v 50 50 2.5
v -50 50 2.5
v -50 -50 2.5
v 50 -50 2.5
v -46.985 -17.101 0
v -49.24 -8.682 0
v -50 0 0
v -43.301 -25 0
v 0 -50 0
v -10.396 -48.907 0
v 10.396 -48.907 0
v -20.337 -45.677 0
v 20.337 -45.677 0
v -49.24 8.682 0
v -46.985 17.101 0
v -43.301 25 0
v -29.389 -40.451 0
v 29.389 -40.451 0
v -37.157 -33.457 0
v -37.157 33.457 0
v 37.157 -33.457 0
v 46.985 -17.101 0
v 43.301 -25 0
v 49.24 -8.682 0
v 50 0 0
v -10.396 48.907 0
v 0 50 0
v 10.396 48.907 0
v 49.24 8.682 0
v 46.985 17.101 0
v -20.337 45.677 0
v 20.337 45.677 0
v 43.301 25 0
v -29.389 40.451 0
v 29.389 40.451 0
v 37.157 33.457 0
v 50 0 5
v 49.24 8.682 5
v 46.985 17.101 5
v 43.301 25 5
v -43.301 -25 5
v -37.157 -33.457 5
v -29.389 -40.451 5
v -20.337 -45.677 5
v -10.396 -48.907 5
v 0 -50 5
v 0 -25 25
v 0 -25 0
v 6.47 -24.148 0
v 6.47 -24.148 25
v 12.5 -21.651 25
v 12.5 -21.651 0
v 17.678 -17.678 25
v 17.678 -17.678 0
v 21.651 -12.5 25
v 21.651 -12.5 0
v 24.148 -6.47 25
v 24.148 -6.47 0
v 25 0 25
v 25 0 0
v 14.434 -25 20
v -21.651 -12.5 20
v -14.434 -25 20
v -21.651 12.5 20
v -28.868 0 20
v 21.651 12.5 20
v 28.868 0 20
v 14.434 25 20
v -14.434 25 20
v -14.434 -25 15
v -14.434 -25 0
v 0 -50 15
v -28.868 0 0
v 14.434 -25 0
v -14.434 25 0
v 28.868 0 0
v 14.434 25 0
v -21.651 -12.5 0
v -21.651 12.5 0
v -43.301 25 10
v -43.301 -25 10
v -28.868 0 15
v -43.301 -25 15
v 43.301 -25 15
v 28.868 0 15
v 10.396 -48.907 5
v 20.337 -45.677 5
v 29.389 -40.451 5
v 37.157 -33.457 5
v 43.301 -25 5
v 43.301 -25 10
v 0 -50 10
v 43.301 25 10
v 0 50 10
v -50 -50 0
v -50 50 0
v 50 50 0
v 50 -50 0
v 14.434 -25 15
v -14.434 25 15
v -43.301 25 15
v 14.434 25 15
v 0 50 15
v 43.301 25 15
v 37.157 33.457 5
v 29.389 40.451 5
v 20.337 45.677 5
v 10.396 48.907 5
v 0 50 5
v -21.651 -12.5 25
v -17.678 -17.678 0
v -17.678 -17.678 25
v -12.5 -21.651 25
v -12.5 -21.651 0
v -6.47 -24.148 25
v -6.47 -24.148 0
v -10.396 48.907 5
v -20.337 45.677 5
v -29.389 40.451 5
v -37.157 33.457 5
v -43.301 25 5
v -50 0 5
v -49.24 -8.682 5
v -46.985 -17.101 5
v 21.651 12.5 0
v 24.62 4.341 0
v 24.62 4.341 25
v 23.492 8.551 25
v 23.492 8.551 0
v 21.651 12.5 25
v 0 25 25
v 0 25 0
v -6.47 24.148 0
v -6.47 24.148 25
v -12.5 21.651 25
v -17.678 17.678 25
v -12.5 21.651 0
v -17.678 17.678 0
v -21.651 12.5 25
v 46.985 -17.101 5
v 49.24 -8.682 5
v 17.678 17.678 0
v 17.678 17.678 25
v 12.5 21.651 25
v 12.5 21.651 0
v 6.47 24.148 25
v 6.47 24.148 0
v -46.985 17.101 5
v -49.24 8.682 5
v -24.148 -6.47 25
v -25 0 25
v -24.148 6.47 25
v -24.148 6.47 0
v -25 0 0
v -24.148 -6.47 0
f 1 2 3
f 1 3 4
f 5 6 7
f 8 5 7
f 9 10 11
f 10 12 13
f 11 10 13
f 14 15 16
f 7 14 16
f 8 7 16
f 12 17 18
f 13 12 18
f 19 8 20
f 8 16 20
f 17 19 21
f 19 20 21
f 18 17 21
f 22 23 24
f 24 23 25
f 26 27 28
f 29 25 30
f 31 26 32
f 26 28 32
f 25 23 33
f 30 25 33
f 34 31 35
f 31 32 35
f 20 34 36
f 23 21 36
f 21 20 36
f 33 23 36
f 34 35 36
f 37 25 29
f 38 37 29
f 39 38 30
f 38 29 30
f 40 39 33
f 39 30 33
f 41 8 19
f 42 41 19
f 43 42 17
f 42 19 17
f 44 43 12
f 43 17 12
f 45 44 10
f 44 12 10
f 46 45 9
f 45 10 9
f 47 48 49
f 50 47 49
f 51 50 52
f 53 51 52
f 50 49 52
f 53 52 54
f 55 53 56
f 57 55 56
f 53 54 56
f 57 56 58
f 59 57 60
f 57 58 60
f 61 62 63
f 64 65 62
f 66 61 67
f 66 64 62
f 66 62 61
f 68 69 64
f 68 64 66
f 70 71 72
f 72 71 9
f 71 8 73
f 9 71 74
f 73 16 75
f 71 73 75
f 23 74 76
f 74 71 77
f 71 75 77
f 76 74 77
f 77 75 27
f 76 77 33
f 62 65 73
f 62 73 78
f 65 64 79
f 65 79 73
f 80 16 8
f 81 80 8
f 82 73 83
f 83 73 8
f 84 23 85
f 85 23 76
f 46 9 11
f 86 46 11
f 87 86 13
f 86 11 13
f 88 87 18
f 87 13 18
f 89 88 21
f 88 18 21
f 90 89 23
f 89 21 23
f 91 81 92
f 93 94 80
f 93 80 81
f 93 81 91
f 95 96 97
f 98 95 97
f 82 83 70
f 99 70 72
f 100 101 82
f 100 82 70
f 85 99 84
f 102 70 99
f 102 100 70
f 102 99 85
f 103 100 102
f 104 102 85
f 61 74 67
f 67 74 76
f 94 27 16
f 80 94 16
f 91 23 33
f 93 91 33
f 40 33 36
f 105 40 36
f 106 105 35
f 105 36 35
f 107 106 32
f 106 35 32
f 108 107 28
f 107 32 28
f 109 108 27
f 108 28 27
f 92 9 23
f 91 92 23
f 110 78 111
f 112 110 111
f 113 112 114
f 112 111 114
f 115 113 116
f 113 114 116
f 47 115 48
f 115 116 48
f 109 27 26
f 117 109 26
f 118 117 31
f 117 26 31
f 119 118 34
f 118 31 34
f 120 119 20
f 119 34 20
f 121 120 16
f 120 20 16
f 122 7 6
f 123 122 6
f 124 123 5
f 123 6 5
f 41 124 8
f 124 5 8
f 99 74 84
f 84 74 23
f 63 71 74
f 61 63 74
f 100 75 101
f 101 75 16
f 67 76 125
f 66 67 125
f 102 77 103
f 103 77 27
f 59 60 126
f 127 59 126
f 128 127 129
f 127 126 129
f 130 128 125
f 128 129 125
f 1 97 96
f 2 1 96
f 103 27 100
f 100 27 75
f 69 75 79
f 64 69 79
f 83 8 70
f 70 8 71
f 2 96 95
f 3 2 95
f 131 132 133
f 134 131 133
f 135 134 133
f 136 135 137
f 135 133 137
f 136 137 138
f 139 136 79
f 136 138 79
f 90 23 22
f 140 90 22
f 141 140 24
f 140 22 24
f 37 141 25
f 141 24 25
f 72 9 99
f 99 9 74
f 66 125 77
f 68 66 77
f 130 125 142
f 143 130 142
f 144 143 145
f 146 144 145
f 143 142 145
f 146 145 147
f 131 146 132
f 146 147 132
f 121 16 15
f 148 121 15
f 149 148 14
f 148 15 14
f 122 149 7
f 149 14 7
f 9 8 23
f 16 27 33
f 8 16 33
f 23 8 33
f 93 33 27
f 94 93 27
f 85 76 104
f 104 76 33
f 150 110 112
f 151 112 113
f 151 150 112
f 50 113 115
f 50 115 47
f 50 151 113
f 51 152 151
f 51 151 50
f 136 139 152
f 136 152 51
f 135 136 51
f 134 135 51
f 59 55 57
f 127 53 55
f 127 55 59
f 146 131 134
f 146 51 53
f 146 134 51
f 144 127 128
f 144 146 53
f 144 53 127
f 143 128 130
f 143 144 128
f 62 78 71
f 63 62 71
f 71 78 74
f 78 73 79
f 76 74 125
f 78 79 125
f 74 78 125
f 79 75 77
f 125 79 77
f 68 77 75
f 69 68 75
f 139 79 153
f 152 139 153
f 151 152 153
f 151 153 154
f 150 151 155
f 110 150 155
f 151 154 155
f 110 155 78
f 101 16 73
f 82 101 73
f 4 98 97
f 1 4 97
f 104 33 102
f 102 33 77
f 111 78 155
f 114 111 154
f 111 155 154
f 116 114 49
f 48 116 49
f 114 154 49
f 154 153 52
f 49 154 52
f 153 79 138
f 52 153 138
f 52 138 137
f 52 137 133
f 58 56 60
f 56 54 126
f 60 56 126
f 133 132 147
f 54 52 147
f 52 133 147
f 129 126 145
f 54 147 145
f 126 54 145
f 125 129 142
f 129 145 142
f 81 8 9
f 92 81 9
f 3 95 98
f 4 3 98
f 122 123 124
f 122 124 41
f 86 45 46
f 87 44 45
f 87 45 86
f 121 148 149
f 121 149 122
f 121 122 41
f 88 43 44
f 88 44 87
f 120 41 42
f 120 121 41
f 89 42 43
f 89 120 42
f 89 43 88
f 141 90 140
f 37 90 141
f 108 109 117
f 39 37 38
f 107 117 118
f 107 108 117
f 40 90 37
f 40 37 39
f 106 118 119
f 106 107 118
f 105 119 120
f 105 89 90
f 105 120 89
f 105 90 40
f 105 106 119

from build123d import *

# Parameters (mm, degrees)
F1_DEPTH = 25
F2_DEPTH = 20
F3_DEPTH = 15
F4_DEPTH = 10
F5_DEPTH = 5
F6_DEPTH = 2.5


with BuildPart() as f1:
    # F0 (on Top) → F1 (new body)
    with BuildSketch(Plane.XY):
        with BuildLine():
            ThreePointArc((21.6506349485, 12.5000002531), (12.4999998734, 21.6506351677), (0, 25))
            ThreePointArc((0, 25), (-12.499999828, 21.6506351939), (-21.650634896, 12.500000344))
            ThreePointArc((-21.650634896, 12.500000344), (-25, 2.051e-07), (-21.6506351011, -12.4999999888))
            ThreePointArc((-21.6506351011, -12.4999999888), (-12.4999999898, -21.6506351005), (3.65e-08, -25))
            ThreePointArc((3.65e-08, -25), (12.5000002944, -21.6506349246), (21.6506354163, -12.4999994428))
            ThreePointArc((21.6506354163, -12.4999994428), (24.1481457405, -6.4704758168), (25, 0))
            ThreePointArc((25, 0), (24.1481456194, 6.4704762687), (21.6506349485, 12.5000002531))
        make_face()
    extrude(amount=F1_DEPTH)


with BuildPart() as f2:
    # F0 (on Top) → F2 (new body)
    with BuildSketch(Plane.XY):
        with BuildLine():
            Line((-21.650634896, 12.500000344), (-28.8675134595, 0))
            Line((-28.8675134595, 0), (-21.6506351011, -12.4999999888))
            ThreePointArc((-21.6506351011, -12.4999999888), (-25, 2.051e-07), (-21.650634896, 12.500000344))
        make_face()
        with BuildLine():
            Line((0, 25), (-14.4337567297, 25))
            Line((-14.4337567297, 25), (-21.650634896, 12.500000344))
            ThreePointArc((-21.650634896, 12.500000344), (-12.499999828, 21.6506351939), (0, 25))
        make_face()
        with BuildLine():
            Line((21.6506349485, 12.5000002531), (14.4337567297, 25))
            Line((14.4337567297, 25), (0, 25))
            ThreePointArc((0, 25), (12.4999998734, 21.6506351677), (21.6506349485, 12.5000002531))
        make_face()
        with BuildLine():
            Line((21.6506354163, -12.4999994428), (28.8675134595, 0))
            Line((28.8675134595, 0), (21.6506349485, 12.5000002531))
            ThreePointArc((21.6506349485, 12.5000002531), (24.1481456194, 6.4704762687), (25, 0))
            ThreePointArc((25, 0), (24.1481457405, -6.4704758168), (21.6506354163, -12.4999994428))
        make_face()
        with BuildLine():
            Line((3.65e-08, -25), (14.4337567297, -25))
            Line((14.4337567297, -25), (21.6506354163, -12.4999994428))
            ThreePointArc((21.6506354163, -12.4999994428), (12.5000002944, -21.6506349246), (3.65e-08, -25))
        make_face()
        with BuildLine():
            Line((-21.6506351011, -12.4999999888), (-14.4337567297, -25))
            Line((-14.4337567297, -25), (3.65e-08, -25))
            ThreePointArc((3.65e-08, -25), (-12.4999999898, -21.6506351005), (-21.6506351011, -12.4999999888))
        make_face()
        with BuildLine():
            ThreePointArc((21.6506349485, 12.5000002531), (12.4999998734, 21.6506351677), (0, 25))
            ThreePointArc((0, 25), (-12.499999828, 21.6506351939), (-21.650634896, 12.500000344))
            ThreePointArc((-21.650634896, 12.500000344), (-25, 2.051e-07), (-21.6506351011, -12.4999999888))
            ThreePointArc((-21.6506351011, -12.4999999888), (-12.4999999898, -21.6506351005), (3.65e-08, -25))
            ThreePointArc((3.65e-08, -25), (12.5000002944, -21.6506349246), (21.6506354163, -12.4999994428))
            ThreePointArc((21.6506354163, -12.4999994428), (24.1481457405, -6.4704758168), (25, 0))
            ThreePointArc((25, 0), (24.1481456194, 6.4704762687), (21.6506349485, 12.5000002531))
        make_face()
    extrude(amount=F2_DEPTH)


with BuildPart() as f3:
    # F0 (on Top) → F3 (new body)
    with BuildSketch(Plane.XY):
        with BuildLine():
            Line((0, 25), (-14.4337567297, 25))
            Line((-14.4337567297, 25), (-21.650634896, 12.500000344))
            ThreePointArc((-21.650634896, 12.500000344), (-12.499999828, 21.6506351939), (0, 25))
        make_face()
        with BuildLine():
            Line((21.6506349485, 12.5000002531), (14.4337567297, 25))
            Line((14.4337567297, 25), (0, 25))
            ThreePointArc((0, 25), (12.4999998734, 21.6506351677), (21.6506349485, 12.5000002531))
        make_face()
        with BuildLine():
            ThreePointArc((21.6506349485, 12.5000002531), (12.4999998734, 21.6506351677), (0, 25))
            ThreePointArc((0, 25), (-12.499999828, 21.6506351939), (-21.650634896, 12.500000344))
            ThreePointArc((-21.650634896, 12.500000344), (-25, 2.051e-07), (-21.6506351011, -12.4999999888))
            ThreePointArc((-21.6506351011, -12.4999999888), (-12.4999999898, -21.6506351005), (3.65e-08, -25))
            ThreePointArc((3.65e-08, -25), (12.5000002944, -21.6506349246), (21.6506354163, -12.4999994428))
            ThreePointArc((21.6506354163, -12.4999994428), (24.1481457405, -6.4704758168), (25, 0))
            ThreePointArc((25, 0), (24.1481456194, 6.4704762687), (21.6506349485, 12.5000002531))
        make_face()
        with BuildLine():
            Line((21.6506354163, -12.4999994428), (28.8675134595, 0))
            Line((28.8675134595, 0), (21.6506349485, 12.5000002531))
            ThreePointArc((21.6506349485, 12.5000002531), (24.1481456194, 6.4704762687), (25, 0))
            ThreePointArc((25, 0), (24.1481457405, -6.4704758168), (21.6506354163, -12.4999994428))
        make_face()
        with BuildLine():
            Line((3.65e-08, -25), (14.4337567297, -25))
            Line((14.4337567297, -25), (21.6506354163, -12.4999994428))
            ThreePointArc((21.6506354163, -12.4999994428), (12.5000002944, -21.6506349246), (3.65e-08, -25))
        make_face()
        with BuildLine():
            Line((-21.6506351011, -12.4999999888), (-14.4337567297, -25))
            Line((-14.4337567297, -25), (3.65e-08, -25))
            ThreePointArc((3.65e-08, -25), (-12.4999999898, -21.6506351005), (-21.6506351011, -12.4999999888))
        make_face()
        with BuildLine():
            Line((-21.650634896, 12.500000344), (-28.8675134595, 0))
            Line((-28.8675134595, 0), (-21.6506351011, -12.4999999888))
            ThreePointArc((-21.6506351011, -12.4999999888), (-25, 2.051e-07), (-21.650634896, 12.500000344))
        make_face()
        Polygon((28.8675134595, 0), (43.3012701892, 25), (14.4337567297, 25), (21.6506349485, 12.5000002531), align=None)
        Polygon((-14.4337567297, -25), (0, -50), (14.4337567297, -25), (3.65e-08, -25), align=None)
        Polygon((14.4337567297, -25), (43.3012701892, -25), (28.8675134595, 0), (21.6506354163, -12.4999994428), align=None)
        Polygon((14.4337567297, 25), (0, 50), (-14.4337567297, 25), (0, 25), align=None)
        Polygon((-14.4337567297, 25), (-43.3012701892, 25), (-28.8675134595, 0), (-21.650634896, 12.500000344), align=None)
        Polygon((-28.8675134595, 0), (-43.3012701892, -25), (-14.4337567297, -25), (-21.6506351011, -12.4999999888), align=None)
    extrude(amount=F3_DEPTH)


with BuildPart() as f4:
    # F0 (on Top) → F4 (new body)
    with BuildSketch(Plane.XY):
        with BuildLine():
            ThreePointArc((21.6506349485, 12.5000002531), (12.4999998734, 21.6506351677), (0, 25))
            ThreePointArc((0, 25), (-12.499999828, 21.6506351939), (-21.650634896, 12.500000344))
            ThreePointArc((-21.650634896, 12.500000344), (-25, 2.051e-07), (-21.6506351011, -12.4999999888))
            ThreePointArc((-21.6506351011, -12.4999999888), (-12.4999999898, -21.6506351005), (3.65e-08, -25))
            ThreePointArc((3.65e-08, -25), (12.5000002944, -21.6506349246), (21.6506354163, -12.4999994428))
            ThreePointArc((21.6506354163, -12.4999994428), (24.1481457405, -6.4704758168), (25, 0))
            ThreePointArc((25, 0), (24.1481456194, 6.4704762687), (21.6506349485, 12.5000002531))
        make_face()
        with BuildLine():
            Line((0, 25), (-14.4337567297, 25))
            Line((-14.4337567297, 25), (-21.650634896, 12.500000344))
            ThreePointArc((-21.650634896, 12.500000344), (-12.499999828, 21.6506351939), (0, 25))
        make_face()
        with BuildLine():
            Line((21.6506349485, 12.5000002531), (14.4337567297, 25))
            Line((14.4337567297, 25), (0, 25))
            ThreePointArc((0, 25), (12.4999998734, 21.6506351677), (21.6506349485, 12.5000002531))
        make_face()
        with BuildLine():
            Line((21.6506354163, -12.4999994428), (28.8675134595, 0))
            Line((28.8675134595, 0), (21.6506349485, 12.5000002531))
            ThreePointArc((21.6506349485, 12.5000002531), (24.1481456194, 6.4704762687), (25, 0))
            ThreePointArc((25, 0), (24.1481457405, -6.4704758168), (21.6506354163, -12.4999994428))
        make_face()
        with BuildLine():
            Line((3.65e-08, -25), (14.4337567297, -25))
            Line((14.4337567297, -25), (21.6506354163, -12.4999994428))
            ThreePointArc((21.6506354163, -12.4999994428), (12.5000002944, -21.6506349246), (3.65e-08, -25))
        make_face()
        with BuildLine():
            Line((-21.6506351011, -12.4999999888), (-14.4337567297, -25))
            Line((-14.4337567297, -25), (3.65e-08, -25))
            ThreePointArc((3.65e-08, -25), (-12.4999999898, -21.6506351005), (-21.6506351011, -12.4999999888))
        make_face()
        with BuildLine():
            Line((-21.650634896, 12.500000344), (-28.8675134595, 0))
            Line((-28.8675134595, 0), (-21.6506351011, -12.4999999888))
            ThreePointArc((-21.6506351011, -12.4999999888), (-25, 2.051e-07), (-21.650634896, 12.500000344))
        make_face()
        Polygon((-14.4337567297, 25), (-43.3012701892, 25), (-28.8675134595, 0), (-21.650634896, 12.500000344), align=None)
        Polygon((-28.8675134595, 0), (-43.3012701892, -25), (-14.4337567297, -25), (-21.6506351011, -12.4999999888), align=None)
        Polygon((-14.4337567297, -25), (0, -50), (14.4337567297, -25), (3.65e-08, -25), align=None)
        Polygon((14.4337567297, -25), (43.3012701892, -25), (28.8675134595, 0), (21.6506354163, -12.4999994428), align=None)
        Polygon((28.8675134595, 0), (43.3012701892, 25), (14.4337567297, 25), (21.6506349485, 12.5000002531), align=None)
        Polygon((14.4337567297, 25), (0, 50), (-14.4337567297, 25), (0, 25), align=None)
        Polygon((-14.4337567297, 25), (0, 50), (-43.3012701892, 25), align=None)
        Polygon((14.4337567297, 25), (43.3012701892, 25), (0, 50), align=None)
        Polygon((43.3012701892, -25), (43.3012701892, 25), (28.8675134595, 0), align=None)
        Polygon((0, -50), (43.3012701892, -25), (14.4337567297, -25), align=None)
        Polygon((-43.3012701892, -25), (0, -50), (-14.4337567297, -25), align=None)
        Polygon((-28.8675134595, 0), (-43.3012701892, 25), (-43.3012701892, -25), align=None)
    extrude(amount=F4_DEPTH)


with BuildPart() as f5:
    # F0 (on Top) → F5 (new body)
    with BuildSketch(Plane.XY):
        with BuildLine():
            Line((-43.3012701892, 25), (0, 50))
            ThreePointArc((0, 50), (-25, 43.3012701892), (-43.3012701892, 25))
        make_face()
        with BuildLine():
            Line((0, 50), (43.3012701892, 25))
            ThreePointArc((43.3012701892, 25), (25, 43.3012701892), (0, 50))
        make_face()
        Polygon((-14.4337567297, 25), (0, 50), (-43.3012701892, 25), align=None)
        Polygon((14.4337567297, 25), (0, 50), (-14.4337567297, 25), (0, 25), align=None)
        Polygon((14.4337567297, 25), (43.3012701892, 25), (0, 50), align=None)
        Polygon((-14.4337567297, 25), (-43.3012701892, 25), (-28.8675134595, 0), (-21.650634896, 12.500000344), align=None)
        with BuildLine():
            Line((0, 25), (-14.4337567297, 25))
            Line((-14.4337567297, 25), (-21.650634896, 12.500000344))
            ThreePointArc((-21.650634896, 12.500000344), (-12.499999828, 21.6506351939), (0, 25))
        make_face()
        with BuildLine():
            Line((21.6506349485, 12.5000002531), (14.4337567297, 25))
            Line((14.4337567297, 25), (0, 25))
            ThreePointArc((0, 25), (12.4999998734, 21.6506351677), (21.6506349485, 12.5000002531))
        make_face()
        Polygon((28.8675134595, 0), (43.3012701892, 25), (14.4337567297, 25), (21.6506349485, 12.5000002531), align=None)
        with BuildLine():
            ThreePointArc((43.3012701892, -25), (48.2962913145, -12.9409522551), (50, 0))
            ThreePointArc((50, 0), (48.2962913145, 12.9409522551), (43.3012701892, 25))
            Line((43.3012701892, 25), (43.3012701892, -25))
        make_face()
        Polygon((43.3012701892, -25), (43.3012701892, 25), (28.8675134595, 0), align=None)
        with BuildLine():
            Line((21.6506354163, -12.4999994428), (28.8675134595, 0))
            Line((28.8675134595, 0), (21.6506349485, 12.5000002531))
            ThreePointArc((21.6506349485, 12.5000002531), (24.1481456194, 6.4704762687), (25, 0))
            ThreePointArc((25, 0), (24.1481457405, -6.4704758168), (21.6506354163, -12.4999994428))
        make_face()
        with BuildLine():
            ThreePointArc((21.6506349485, 12.5000002531), (12.4999998734, 21.6506351677), (0, 25))
            ThreePointArc((0, 25), (-12.499999828, 21.6506351939), (-21.650634896, 12.500000344))
            ThreePointArc((-21.650634896, 12.500000344), (-25, 2.051e-07), (-21.6506351011, -12.4999999888))
            ThreePointArc((-21.6506351011, -12.4999999888), (-12.4999999898, -21.6506351005), (3.65e-08, -25))
            ThreePointArc((3.65e-08, -25), (12.5000002944, -21.6506349246), (21.6506354163, -12.4999994428))
            ThreePointArc((21.6506354163, -12.4999994428), (24.1481457405, -6.4704758168), (25, 0))
            ThreePointArc((25, 0), (24.1481456194, 6.4704762687), (21.6506349485, 12.5000002531))
        make_face()
        with BuildLine():
            Line((-21.650634896, 12.500000344), (-28.8675134595, 0))
            Line((-28.8675134595, 0), (-21.6506351011, -12.4999999888))
            ThreePointArc((-21.6506351011, -12.4999999888), (-25, 2.051e-07), (-21.650634896, 12.500000344))
        make_face()
        Polygon((-28.8675134595, 0), (-43.3012701892, 25), (-43.3012701892, -25), align=None)
        with BuildLine():
            Line((-43.3012701892, -25), (-43.3012701892, 25))
            ThreePointArc((-43.3012701892, 25), (-48.2962913145, 12.9409522551), (-50, 0))
            ThreePointArc((-50, 0), (-48.2962913145, -12.9409522551), (-43.3012701892, -25))
        make_face()
        Polygon((-28.8675134595, 0), (-43.3012701892, -25), (-14.4337567297, -25), (-21.6506351011, -12.4999999888), align=None)
        with BuildLine():
            Line((-21.6506351011, -12.4999999888), (-14.4337567297, -25))
            Line((-14.4337567297, -25), (3.65e-08, -25))
            ThreePointArc((3.65e-08, -25), (-12.4999999898, -21.6506351005), (-21.6506351011, -12.4999999888))
        make_face()
        with BuildLine():
            Line((3.65e-08, -25), (14.4337567297, -25))
            Line((14.4337567297, -25), (21.6506354163, -12.4999994428))
            ThreePointArc((21.6506354163, -12.4999994428), (12.5000002944, -21.6506349246), (3.65e-08, -25))
        make_face()
        Polygon((14.4337567297, -25), (43.3012701892, -25), (28.8675134595, 0), (21.6506354163, -12.4999994428), align=None)
        Polygon((0, -50), (43.3012701892, -25), (14.4337567297, -25), align=None)
        Polygon((-14.4337567297, -25), (0, -50), (14.4337567297, -25), (3.65e-08, -25), align=None)
        Polygon((-43.3012701892, -25), (0, -50), (-14.4337567297, -25), align=None)
        with BuildLine():
            ThreePointArc((-43.3012701892, -25), (-25, -43.3012701892), (0, -50))
            Line((0, -50), (-43.3012701892, -25))
        make_face()
        with BuildLine():
            ThreePointArc((0, -50), (25, -43.3012701892), (43.3012701892, -25))
            Line((43.3012701892, -25), (0, -50))
        make_face()
    extrude(amount=F5_DEPTH)


with BuildPart() as f6:
    # F0 (on Top) → F6 (new body)
    with BuildSketch(Plane.XY):
        with BuildLine():
            ThreePointArc((-43.3012701892, 25), (-25, 43.3012701892), (0, 50))
            Line((0, 50), (-50, 50))
            Line((-50, 50), (-50, 0))
            ThreePointArc((-50, 0), (-48.2962913145, 12.9409522551), (-43.3012701892, 25))
        make_face()
        with BuildLine():
            Line((-43.3012701892, 25), (0, 50))
            ThreePointArc((0, 50), (-25, 43.3012701892), (-43.3012701892, 25))
        make_face()
        Polygon((-14.4337567297, 25), (0, 50), (-43.3012701892, 25), align=None)
        Polygon((14.4337567297, 25), (0, 50), (-14.4337567297, 25), (0, 25), align=None)
        with BuildLine():
            Line((0, 50), (43.3012701892, 25))
            ThreePointArc((43.3012701892, 25), (25, 43.3012701892), (0, 50))
        make_face()
        Polygon((14.4337567297, 25), (43.3012701892, 25), (0, 50), align=None)
        with BuildLine():
            ThreePointArc((43.3012701892, 25), (48.2962913145, 12.9409522551), (50, 0))
            Line((50, 0), (50, 50))
            Line((50, 50), (0, 50))
            ThreePointArc((0, 50), (25, 43.3012701892), (43.3012701892, 25))
        make_face()
        Polygon((28.8675134595, 0), (43.3012701892, 25), (14.4337567297, 25), (21.6506349485, 12.5000002531), align=None)
        Polygon((43.3012701892, -25), (43.3012701892, 25), (28.8675134595, 0), align=None)
        with BuildLine():
            ThreePointArc((43.3012701892, -25), (48.2962913145, -12.9409522551), (50, 0))
            ThreePointArc((50, 0), (48.2962913145, 12.9409522551), (43.3012701892, 25))
            Line((43.3012701892, 25), (43.3012701892, -25))
        make_face()
        with BuildLine():
            ThreePointArc((21.6506349485, 12.5000002531), (12.4999998734, 21.6506351677), (0, 25))
            ThreePointArc((0, 25), (-12.499999828, 21.6506351939), (-21.650634896, 12.500000344))
            ThreePointArc((-21.650634896, 12.500000344), (-25, 2.051e-07), (-21.6506351011, -12.4999999888))
            ThreePointArc((-21.6506351011, -12.4999999888), (-12.4999999898, -21.6506351005), (3.65e-08, -25))
            ThreePointArc((3.65e-08, -25), (12.5000002944, -21.6506349246), (21.6506354163, -12.4999994428))
            ThreePointArc((21.6506354163, -12.4999994428), (24.1481457405, -6.4704758168), (25, 0))
            ThreePointArc((25, 0), (24.1481456194, 6.4704762687), (21.6506349485, 12.5000002531))
        make_face()
        Polygon((-14.4337567297, 25), (-43.3012701892, 25), (-28.8675134595, 0), (-21.650634896, 12.500000344), align=None)
        Polygon((-28.8675134595, 0), (-43.3012701892, 25), (-43.3012701892, -25), align=None)
        with BuildLine():
            Line((-43.3012701892, -25), (-43.3012701892, 25))
            ThreePointArc((-43.3012701892, 25), (-48.2962913145, 12.9409522551), (-50, 0))
            ThreePointArc((-50, 0), (-48.2962913145, -12.9409522551), (-43.3012701892, -25))
        make_face()
        Polygon((-28.8675134595, 0), (-43.3012701892, -25), (-14.4337567297, -25), (-21.6506351011, -12.4999999888), align=None)
        with BuildLine():
            Line((-50, -50), (0, -50))
            ThreePointArc((0, -50), (-25, -43.3012701892), (-43.3012701892, -25))
            ThreePointArc((-43.3012701892, -25), (-48.2962913145, -12.9409522551), (-50, 0))
            Line((-50, 0), (-50, -50))
        make_face()
        with BuildLine():
            ThreePointArc((-43.3012701892, -25), (-25, -43.3012701892), (0, -50))
            Line((0, -50), (-43.3012701892, -25))
        make_face()
        Polygon((-43.3012701892, -25), (0, -50), (-14.4337567297, -25), align=None)
        Polygon((-14.4337567297, -25), (0, -50), (14.4337567297, -25), (3.65e-08, -25), align=None)
        Polygon((0, -50), (43.3012701892, -25), (14.4337567297, -25), align=None)
        Polygon((14.4337567297, -25), (43.3012701892, -25), (28.8675134595, 0), (21.6506354163, -12.4999994428), align=None)
        with BuildLine():
            ThreePointArc((0, -50), (25, -43.3012701892), (43.3012701892, -25))
            Line((43.3012701892, -25), (0, -50))
        make_face()
        with BuildLine():
            Line((50, -50), (50, 0))
            ThreePointArc((50, 0), (48.2962913145, -12.9409522551), (43.3012701892, -25))
            ThreePointArc((43.3012701892, -25), (25, -43.3012701892), (0, -50))
            Line((0, -50), (50, -50))
        make_face()
        with BuildLine():
            Line((0, 25), (-14.4337567297, 25))
            Line((-14.4337567297, 25), (-21.650634896, 12.500000344))
            ThreePointArc((-21.650634896, 12.500000344), (-12.499999828, 21.6506351939), (0, 25))
        make_face()
        with BuildLine():
            Line((21.6506349485, 12.5000002531), (14.4337567297, 25))
            Line((14.4337567297, 25), (0, 25))
            ThreePointArc((0, 25), (12.4999998734, 21.6506351677), (21.6506349485, 12.5000002531))
        make_face()
        with BuildLine():
            Line((-21.650634896, 12.500000344), (-28.8675134595, 0))
            Line((-28.8675134595, 0), (-21.6506351011, -12.4999999888))
            ThreePointArc((-21.6506351011, -12.4999999888), (-25, 2.051e-07), (-21.650634896, 12.500000344))
        make_face()
        with BuildLine():
            Line((-21.6506351011, -12.4999999888), (-14.4337567297, -25))
            Line((-14.4337567297, -25), (3.65e-08, -25))
            ThreePointArc((3.65e-08, -25), (-12.4999999898, -21.6506351005), (-21.6506351011, -12.4999999888))
        make_face()
        with BuildLine():
            Line((3.65e-08, -25), (14.4337567297, -25))
            Line((14.4337567297, -25), (21.6506354163, -12.4999994428))
            ThreePointArc((21.6506354163, -12.4999994428), (12.5000002944, -21.6506349246), (3.65e-08, -25))
        make_face()
        with BuildLine():
            Line((21.6506354163, -12.4999994428), (28.8675134595, 0))
            Line((28.8675134595, 0), (21.6506349485, 12.5000002531))
            ThreePointArc((21.6506349485, 12.5000002531), (24.1481456194, 6.4704762687), (25, 0))
            ThreePointArc((25, 0), (24.1481457405, -6.4704758168), (21.6506354163, -12.4999994428))
        make_face()
    extrude(amount=F6_DEPTH)


solid = Compound([f1.part, f2.part, f3.part, f4.part, f5.part, f6.part])
